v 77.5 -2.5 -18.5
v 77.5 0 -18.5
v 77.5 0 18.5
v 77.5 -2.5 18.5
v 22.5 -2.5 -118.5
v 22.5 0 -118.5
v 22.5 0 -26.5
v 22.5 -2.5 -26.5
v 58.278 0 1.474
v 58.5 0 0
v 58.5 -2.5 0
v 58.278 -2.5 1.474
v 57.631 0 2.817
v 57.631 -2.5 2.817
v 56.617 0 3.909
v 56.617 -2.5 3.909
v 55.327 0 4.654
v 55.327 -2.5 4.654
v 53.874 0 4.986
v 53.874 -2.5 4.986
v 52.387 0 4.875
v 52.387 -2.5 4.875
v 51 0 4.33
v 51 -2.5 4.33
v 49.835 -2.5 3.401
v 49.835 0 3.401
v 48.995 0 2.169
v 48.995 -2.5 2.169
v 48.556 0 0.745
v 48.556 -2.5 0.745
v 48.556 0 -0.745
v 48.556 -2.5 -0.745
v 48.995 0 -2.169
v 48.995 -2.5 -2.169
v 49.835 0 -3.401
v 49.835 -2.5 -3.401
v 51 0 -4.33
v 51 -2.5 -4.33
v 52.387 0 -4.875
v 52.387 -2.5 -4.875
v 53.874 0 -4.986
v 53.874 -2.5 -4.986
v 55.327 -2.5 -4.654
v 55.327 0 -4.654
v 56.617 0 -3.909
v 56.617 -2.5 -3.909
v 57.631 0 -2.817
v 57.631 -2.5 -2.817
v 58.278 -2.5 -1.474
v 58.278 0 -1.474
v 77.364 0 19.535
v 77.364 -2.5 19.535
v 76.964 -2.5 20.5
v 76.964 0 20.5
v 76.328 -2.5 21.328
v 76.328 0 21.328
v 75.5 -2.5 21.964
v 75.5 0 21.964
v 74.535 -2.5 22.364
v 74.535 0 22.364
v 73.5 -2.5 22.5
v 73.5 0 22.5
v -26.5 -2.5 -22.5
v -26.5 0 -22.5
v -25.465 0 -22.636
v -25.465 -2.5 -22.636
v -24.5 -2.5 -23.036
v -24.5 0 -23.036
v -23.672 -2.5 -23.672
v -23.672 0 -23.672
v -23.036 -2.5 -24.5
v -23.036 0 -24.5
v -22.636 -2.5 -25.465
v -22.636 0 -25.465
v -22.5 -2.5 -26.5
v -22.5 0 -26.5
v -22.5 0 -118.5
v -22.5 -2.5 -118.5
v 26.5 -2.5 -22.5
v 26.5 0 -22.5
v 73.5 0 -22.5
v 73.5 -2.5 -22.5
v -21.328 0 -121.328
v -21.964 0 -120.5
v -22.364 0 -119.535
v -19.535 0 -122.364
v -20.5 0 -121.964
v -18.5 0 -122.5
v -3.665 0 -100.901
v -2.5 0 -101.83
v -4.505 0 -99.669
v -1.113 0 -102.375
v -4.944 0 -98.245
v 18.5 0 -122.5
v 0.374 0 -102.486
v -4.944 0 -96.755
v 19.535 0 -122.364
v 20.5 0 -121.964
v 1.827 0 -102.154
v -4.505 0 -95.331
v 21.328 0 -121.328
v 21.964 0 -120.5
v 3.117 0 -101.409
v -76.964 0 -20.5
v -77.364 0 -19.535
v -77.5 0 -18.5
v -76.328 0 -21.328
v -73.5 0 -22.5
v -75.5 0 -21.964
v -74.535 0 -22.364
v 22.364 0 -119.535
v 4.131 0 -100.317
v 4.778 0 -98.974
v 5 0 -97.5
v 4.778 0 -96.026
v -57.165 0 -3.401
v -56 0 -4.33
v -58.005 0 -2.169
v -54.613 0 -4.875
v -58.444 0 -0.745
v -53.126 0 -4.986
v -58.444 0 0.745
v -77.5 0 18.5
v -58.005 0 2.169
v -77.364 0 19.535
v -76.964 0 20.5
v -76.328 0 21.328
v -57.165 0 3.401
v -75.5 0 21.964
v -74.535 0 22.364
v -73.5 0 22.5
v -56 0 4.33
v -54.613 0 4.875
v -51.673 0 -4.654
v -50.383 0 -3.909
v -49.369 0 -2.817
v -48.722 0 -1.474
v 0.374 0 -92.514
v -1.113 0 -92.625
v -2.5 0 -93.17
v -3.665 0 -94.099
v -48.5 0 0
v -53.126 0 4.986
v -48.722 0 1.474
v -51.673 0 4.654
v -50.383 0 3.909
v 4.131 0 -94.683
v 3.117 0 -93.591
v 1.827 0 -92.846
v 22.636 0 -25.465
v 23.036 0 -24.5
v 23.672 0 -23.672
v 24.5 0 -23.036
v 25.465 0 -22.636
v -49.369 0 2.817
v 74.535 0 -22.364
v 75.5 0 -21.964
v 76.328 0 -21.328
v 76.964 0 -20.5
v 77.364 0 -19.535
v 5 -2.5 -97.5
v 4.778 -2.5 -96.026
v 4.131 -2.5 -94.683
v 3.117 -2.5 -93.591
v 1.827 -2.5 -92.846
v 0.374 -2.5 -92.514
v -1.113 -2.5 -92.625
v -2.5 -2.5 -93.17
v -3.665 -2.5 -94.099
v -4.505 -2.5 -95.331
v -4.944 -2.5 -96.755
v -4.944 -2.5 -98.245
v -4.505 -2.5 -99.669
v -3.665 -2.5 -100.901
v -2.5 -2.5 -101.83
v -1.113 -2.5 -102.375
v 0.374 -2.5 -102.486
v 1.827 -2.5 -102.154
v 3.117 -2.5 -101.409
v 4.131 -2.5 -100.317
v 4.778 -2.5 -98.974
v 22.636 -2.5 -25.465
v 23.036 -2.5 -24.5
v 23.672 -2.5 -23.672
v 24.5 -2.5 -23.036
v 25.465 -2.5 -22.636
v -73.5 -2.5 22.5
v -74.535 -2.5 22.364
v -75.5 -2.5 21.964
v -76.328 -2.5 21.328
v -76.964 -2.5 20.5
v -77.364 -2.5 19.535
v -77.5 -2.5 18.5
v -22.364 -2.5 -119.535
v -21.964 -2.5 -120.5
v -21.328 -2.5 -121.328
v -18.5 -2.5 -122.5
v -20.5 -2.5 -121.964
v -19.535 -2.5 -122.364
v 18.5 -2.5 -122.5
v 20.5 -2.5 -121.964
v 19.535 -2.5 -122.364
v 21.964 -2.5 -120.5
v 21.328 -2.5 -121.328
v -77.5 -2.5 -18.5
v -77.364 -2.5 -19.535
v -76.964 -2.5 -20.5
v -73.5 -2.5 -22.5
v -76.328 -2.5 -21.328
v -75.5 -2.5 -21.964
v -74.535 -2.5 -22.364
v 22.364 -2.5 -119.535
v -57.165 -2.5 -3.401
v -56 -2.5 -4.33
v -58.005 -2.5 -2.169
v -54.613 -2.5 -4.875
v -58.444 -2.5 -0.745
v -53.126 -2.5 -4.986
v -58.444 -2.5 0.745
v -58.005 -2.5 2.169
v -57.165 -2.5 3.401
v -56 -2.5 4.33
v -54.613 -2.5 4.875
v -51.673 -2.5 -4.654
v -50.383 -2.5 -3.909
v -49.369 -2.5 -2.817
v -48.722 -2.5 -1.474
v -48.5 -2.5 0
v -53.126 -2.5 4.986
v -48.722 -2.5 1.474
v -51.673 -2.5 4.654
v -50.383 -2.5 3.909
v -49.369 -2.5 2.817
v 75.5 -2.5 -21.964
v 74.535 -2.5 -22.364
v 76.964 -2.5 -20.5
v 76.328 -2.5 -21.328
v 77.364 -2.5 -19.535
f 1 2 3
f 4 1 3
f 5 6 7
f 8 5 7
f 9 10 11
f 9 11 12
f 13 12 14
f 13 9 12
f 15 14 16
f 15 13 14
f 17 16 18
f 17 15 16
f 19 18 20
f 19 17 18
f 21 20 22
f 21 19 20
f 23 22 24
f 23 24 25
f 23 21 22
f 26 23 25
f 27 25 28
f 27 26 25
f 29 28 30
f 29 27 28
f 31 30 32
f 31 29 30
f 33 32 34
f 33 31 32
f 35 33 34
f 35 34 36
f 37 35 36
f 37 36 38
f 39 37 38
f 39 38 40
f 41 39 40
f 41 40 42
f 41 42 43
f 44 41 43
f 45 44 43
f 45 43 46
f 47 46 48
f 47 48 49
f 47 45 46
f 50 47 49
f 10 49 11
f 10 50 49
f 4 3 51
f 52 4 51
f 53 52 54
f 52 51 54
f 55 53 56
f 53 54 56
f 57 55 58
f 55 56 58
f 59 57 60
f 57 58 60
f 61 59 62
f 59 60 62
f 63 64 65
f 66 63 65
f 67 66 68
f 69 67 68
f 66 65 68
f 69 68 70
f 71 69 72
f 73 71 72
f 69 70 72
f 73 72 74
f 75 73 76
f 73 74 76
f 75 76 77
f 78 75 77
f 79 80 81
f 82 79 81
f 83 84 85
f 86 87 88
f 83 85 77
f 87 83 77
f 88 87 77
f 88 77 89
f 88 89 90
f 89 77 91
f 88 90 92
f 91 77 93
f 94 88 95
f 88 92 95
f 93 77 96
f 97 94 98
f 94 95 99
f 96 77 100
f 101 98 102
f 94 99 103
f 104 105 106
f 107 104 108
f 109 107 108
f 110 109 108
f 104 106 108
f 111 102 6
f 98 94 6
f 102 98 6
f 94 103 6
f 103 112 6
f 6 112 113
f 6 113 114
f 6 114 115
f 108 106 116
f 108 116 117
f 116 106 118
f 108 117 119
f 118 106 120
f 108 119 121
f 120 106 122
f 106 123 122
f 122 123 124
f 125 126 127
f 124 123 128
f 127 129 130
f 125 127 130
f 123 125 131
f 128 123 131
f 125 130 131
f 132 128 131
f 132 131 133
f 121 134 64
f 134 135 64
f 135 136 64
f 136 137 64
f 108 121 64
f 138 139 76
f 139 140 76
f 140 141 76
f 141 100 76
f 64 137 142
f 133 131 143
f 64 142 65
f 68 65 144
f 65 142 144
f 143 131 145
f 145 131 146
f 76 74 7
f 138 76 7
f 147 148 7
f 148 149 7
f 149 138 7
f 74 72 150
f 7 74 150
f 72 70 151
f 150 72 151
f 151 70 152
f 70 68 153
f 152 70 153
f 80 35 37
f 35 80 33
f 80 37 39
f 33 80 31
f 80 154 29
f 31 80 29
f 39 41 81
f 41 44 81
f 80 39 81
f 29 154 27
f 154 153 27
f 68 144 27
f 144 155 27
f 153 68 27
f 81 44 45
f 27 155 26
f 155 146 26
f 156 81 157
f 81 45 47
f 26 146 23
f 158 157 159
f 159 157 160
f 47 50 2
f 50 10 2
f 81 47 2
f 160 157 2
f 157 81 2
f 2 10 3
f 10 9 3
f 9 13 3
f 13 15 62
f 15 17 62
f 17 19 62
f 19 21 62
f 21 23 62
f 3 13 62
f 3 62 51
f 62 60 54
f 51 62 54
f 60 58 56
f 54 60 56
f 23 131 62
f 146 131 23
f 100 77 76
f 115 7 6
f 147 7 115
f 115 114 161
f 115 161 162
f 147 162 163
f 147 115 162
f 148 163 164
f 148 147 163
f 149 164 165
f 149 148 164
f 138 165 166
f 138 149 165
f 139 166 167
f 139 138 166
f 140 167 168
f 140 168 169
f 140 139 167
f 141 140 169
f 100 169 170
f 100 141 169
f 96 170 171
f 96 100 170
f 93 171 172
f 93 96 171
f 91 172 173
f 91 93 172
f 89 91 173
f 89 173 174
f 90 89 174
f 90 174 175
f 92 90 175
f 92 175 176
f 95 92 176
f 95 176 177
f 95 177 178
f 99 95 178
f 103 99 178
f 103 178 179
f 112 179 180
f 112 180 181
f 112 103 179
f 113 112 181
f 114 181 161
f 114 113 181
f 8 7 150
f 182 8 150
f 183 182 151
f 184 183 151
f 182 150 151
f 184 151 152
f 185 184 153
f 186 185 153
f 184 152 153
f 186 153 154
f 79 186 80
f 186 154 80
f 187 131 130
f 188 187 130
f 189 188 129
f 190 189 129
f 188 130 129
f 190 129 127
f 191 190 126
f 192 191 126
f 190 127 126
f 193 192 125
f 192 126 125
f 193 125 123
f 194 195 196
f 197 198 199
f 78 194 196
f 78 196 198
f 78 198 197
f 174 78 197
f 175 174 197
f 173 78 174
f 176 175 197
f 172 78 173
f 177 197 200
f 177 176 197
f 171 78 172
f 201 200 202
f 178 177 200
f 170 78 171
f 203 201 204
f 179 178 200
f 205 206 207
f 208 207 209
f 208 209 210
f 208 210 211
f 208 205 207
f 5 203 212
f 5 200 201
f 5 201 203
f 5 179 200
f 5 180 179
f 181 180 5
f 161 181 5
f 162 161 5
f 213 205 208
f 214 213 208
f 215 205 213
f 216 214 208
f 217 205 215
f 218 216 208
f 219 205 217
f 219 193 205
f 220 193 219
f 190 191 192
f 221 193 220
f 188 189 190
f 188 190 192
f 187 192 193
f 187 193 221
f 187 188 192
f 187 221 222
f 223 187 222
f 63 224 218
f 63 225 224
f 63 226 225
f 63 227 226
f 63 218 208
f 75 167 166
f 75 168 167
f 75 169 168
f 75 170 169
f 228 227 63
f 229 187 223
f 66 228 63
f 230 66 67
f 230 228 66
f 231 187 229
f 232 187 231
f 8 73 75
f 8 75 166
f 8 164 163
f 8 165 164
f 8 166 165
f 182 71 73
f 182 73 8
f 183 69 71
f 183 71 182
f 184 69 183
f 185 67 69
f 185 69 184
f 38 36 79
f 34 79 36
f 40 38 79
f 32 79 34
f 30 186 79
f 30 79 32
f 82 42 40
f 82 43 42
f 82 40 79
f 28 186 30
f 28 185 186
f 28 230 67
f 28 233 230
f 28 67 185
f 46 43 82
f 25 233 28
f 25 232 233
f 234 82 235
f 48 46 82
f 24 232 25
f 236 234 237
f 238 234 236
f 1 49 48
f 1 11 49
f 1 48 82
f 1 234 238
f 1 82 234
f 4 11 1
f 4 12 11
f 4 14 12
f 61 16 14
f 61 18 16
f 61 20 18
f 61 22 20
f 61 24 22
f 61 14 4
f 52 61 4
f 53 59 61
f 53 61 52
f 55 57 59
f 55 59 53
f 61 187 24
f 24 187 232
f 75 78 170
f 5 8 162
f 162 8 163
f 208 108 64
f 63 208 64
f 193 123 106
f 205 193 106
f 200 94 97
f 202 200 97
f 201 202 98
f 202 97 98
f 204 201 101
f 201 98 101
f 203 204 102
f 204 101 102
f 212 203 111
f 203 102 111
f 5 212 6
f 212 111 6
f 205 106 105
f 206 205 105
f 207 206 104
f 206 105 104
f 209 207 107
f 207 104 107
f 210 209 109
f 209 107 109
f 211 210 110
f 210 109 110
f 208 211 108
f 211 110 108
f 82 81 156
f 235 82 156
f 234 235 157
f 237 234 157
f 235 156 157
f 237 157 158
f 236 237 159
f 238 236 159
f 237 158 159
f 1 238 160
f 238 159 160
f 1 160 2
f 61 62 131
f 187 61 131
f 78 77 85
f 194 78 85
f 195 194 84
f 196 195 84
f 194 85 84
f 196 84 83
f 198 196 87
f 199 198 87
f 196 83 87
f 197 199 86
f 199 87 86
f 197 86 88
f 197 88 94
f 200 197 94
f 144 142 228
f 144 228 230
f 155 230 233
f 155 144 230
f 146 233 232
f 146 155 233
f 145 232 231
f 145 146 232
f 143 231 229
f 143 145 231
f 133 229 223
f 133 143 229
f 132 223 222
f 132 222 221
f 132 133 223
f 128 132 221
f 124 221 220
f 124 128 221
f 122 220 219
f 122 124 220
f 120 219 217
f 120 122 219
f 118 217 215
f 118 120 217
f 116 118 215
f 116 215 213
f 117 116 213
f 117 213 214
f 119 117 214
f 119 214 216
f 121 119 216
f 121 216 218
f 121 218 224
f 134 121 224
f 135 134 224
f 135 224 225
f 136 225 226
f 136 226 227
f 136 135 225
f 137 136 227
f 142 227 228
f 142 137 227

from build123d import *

# Parameters (mm, degrees)
F0_R     = 5
F1_DEPTH = 2.5


with BuildPart() as f1:
    # F0 (on Front) → F1 (new body)
    with BuildSketch(Plane.XZ):
        with BuildLine():
            ThreePointArc((77.5, 18.5), (76.328427, 21.328427), (73.5, 22.5))
            Line((73.5, 22.5), (-73.5, 22.5))
            ThreePointArc((-73.5, 22.5), (-76.328427, 21.328427), (-77.5, 18.5))
            Line((-77.5, 18.5), (-77.5, -18.5))
            ThreePointArc((-77.5, -18.5), (-76.328427, -21.328427), (-73.5, -22.5))
            Line((-73.5, -22.5), (-26.5, -22.5))
            Line((-26.5, -22.5), (22.5, -22.5))
            Line((22.5, -22.5), (26.5, -22.5))
            Line((26.5, -22.5), (73.5, -22.5))
            ThreePointArc((73.5, -22.5), (76.328427, -21.328427), (77.5, -18.5))
            Line((77.5, -18.5), (77.5, 18.5))
        make_face()
        with Locations((-53.5, 0)):
            Circle(F0_R, mode=Mode.SUBTRACT)
        with Locations((53.5, 0)):
            Circle(F0_R, mode=Mode.SUBTRACT)
        with BuildLine():
            ThreePointArc((22.5, -26.5), (23.671573, -23.671573), (26.5, -22.5))
            Line((26.5, -22.5), (22.5, -22.5))
            Line((22.5, -22.5), (-26.5, -22.5))
            ThreePointArc((-26.5, -22.5), (-23.671573, -23.671573), (-22.5, -26.5))
            Line((-22.5, -26.5), (-22.5, -118.5))
            ThreePointArc((-22.5, -118.5), (-21.328427, -121.328427), (-18.5, -122.5))
            Line((-18.5, -122.5), (18.5, -122.5))
            ThreePointArc((18.5, -122.5), (21.328427, -121.328427), (22.5, -118.5))
            Line((22.5, -118.5), (22.5, -26.5))
        make_face()
        with Locations((0, -97.5)):
            Circle(F0_R, mode=Mode.SUBTRACT)
    extrude(amount=F1_DEPTH)


solid = f1.part
